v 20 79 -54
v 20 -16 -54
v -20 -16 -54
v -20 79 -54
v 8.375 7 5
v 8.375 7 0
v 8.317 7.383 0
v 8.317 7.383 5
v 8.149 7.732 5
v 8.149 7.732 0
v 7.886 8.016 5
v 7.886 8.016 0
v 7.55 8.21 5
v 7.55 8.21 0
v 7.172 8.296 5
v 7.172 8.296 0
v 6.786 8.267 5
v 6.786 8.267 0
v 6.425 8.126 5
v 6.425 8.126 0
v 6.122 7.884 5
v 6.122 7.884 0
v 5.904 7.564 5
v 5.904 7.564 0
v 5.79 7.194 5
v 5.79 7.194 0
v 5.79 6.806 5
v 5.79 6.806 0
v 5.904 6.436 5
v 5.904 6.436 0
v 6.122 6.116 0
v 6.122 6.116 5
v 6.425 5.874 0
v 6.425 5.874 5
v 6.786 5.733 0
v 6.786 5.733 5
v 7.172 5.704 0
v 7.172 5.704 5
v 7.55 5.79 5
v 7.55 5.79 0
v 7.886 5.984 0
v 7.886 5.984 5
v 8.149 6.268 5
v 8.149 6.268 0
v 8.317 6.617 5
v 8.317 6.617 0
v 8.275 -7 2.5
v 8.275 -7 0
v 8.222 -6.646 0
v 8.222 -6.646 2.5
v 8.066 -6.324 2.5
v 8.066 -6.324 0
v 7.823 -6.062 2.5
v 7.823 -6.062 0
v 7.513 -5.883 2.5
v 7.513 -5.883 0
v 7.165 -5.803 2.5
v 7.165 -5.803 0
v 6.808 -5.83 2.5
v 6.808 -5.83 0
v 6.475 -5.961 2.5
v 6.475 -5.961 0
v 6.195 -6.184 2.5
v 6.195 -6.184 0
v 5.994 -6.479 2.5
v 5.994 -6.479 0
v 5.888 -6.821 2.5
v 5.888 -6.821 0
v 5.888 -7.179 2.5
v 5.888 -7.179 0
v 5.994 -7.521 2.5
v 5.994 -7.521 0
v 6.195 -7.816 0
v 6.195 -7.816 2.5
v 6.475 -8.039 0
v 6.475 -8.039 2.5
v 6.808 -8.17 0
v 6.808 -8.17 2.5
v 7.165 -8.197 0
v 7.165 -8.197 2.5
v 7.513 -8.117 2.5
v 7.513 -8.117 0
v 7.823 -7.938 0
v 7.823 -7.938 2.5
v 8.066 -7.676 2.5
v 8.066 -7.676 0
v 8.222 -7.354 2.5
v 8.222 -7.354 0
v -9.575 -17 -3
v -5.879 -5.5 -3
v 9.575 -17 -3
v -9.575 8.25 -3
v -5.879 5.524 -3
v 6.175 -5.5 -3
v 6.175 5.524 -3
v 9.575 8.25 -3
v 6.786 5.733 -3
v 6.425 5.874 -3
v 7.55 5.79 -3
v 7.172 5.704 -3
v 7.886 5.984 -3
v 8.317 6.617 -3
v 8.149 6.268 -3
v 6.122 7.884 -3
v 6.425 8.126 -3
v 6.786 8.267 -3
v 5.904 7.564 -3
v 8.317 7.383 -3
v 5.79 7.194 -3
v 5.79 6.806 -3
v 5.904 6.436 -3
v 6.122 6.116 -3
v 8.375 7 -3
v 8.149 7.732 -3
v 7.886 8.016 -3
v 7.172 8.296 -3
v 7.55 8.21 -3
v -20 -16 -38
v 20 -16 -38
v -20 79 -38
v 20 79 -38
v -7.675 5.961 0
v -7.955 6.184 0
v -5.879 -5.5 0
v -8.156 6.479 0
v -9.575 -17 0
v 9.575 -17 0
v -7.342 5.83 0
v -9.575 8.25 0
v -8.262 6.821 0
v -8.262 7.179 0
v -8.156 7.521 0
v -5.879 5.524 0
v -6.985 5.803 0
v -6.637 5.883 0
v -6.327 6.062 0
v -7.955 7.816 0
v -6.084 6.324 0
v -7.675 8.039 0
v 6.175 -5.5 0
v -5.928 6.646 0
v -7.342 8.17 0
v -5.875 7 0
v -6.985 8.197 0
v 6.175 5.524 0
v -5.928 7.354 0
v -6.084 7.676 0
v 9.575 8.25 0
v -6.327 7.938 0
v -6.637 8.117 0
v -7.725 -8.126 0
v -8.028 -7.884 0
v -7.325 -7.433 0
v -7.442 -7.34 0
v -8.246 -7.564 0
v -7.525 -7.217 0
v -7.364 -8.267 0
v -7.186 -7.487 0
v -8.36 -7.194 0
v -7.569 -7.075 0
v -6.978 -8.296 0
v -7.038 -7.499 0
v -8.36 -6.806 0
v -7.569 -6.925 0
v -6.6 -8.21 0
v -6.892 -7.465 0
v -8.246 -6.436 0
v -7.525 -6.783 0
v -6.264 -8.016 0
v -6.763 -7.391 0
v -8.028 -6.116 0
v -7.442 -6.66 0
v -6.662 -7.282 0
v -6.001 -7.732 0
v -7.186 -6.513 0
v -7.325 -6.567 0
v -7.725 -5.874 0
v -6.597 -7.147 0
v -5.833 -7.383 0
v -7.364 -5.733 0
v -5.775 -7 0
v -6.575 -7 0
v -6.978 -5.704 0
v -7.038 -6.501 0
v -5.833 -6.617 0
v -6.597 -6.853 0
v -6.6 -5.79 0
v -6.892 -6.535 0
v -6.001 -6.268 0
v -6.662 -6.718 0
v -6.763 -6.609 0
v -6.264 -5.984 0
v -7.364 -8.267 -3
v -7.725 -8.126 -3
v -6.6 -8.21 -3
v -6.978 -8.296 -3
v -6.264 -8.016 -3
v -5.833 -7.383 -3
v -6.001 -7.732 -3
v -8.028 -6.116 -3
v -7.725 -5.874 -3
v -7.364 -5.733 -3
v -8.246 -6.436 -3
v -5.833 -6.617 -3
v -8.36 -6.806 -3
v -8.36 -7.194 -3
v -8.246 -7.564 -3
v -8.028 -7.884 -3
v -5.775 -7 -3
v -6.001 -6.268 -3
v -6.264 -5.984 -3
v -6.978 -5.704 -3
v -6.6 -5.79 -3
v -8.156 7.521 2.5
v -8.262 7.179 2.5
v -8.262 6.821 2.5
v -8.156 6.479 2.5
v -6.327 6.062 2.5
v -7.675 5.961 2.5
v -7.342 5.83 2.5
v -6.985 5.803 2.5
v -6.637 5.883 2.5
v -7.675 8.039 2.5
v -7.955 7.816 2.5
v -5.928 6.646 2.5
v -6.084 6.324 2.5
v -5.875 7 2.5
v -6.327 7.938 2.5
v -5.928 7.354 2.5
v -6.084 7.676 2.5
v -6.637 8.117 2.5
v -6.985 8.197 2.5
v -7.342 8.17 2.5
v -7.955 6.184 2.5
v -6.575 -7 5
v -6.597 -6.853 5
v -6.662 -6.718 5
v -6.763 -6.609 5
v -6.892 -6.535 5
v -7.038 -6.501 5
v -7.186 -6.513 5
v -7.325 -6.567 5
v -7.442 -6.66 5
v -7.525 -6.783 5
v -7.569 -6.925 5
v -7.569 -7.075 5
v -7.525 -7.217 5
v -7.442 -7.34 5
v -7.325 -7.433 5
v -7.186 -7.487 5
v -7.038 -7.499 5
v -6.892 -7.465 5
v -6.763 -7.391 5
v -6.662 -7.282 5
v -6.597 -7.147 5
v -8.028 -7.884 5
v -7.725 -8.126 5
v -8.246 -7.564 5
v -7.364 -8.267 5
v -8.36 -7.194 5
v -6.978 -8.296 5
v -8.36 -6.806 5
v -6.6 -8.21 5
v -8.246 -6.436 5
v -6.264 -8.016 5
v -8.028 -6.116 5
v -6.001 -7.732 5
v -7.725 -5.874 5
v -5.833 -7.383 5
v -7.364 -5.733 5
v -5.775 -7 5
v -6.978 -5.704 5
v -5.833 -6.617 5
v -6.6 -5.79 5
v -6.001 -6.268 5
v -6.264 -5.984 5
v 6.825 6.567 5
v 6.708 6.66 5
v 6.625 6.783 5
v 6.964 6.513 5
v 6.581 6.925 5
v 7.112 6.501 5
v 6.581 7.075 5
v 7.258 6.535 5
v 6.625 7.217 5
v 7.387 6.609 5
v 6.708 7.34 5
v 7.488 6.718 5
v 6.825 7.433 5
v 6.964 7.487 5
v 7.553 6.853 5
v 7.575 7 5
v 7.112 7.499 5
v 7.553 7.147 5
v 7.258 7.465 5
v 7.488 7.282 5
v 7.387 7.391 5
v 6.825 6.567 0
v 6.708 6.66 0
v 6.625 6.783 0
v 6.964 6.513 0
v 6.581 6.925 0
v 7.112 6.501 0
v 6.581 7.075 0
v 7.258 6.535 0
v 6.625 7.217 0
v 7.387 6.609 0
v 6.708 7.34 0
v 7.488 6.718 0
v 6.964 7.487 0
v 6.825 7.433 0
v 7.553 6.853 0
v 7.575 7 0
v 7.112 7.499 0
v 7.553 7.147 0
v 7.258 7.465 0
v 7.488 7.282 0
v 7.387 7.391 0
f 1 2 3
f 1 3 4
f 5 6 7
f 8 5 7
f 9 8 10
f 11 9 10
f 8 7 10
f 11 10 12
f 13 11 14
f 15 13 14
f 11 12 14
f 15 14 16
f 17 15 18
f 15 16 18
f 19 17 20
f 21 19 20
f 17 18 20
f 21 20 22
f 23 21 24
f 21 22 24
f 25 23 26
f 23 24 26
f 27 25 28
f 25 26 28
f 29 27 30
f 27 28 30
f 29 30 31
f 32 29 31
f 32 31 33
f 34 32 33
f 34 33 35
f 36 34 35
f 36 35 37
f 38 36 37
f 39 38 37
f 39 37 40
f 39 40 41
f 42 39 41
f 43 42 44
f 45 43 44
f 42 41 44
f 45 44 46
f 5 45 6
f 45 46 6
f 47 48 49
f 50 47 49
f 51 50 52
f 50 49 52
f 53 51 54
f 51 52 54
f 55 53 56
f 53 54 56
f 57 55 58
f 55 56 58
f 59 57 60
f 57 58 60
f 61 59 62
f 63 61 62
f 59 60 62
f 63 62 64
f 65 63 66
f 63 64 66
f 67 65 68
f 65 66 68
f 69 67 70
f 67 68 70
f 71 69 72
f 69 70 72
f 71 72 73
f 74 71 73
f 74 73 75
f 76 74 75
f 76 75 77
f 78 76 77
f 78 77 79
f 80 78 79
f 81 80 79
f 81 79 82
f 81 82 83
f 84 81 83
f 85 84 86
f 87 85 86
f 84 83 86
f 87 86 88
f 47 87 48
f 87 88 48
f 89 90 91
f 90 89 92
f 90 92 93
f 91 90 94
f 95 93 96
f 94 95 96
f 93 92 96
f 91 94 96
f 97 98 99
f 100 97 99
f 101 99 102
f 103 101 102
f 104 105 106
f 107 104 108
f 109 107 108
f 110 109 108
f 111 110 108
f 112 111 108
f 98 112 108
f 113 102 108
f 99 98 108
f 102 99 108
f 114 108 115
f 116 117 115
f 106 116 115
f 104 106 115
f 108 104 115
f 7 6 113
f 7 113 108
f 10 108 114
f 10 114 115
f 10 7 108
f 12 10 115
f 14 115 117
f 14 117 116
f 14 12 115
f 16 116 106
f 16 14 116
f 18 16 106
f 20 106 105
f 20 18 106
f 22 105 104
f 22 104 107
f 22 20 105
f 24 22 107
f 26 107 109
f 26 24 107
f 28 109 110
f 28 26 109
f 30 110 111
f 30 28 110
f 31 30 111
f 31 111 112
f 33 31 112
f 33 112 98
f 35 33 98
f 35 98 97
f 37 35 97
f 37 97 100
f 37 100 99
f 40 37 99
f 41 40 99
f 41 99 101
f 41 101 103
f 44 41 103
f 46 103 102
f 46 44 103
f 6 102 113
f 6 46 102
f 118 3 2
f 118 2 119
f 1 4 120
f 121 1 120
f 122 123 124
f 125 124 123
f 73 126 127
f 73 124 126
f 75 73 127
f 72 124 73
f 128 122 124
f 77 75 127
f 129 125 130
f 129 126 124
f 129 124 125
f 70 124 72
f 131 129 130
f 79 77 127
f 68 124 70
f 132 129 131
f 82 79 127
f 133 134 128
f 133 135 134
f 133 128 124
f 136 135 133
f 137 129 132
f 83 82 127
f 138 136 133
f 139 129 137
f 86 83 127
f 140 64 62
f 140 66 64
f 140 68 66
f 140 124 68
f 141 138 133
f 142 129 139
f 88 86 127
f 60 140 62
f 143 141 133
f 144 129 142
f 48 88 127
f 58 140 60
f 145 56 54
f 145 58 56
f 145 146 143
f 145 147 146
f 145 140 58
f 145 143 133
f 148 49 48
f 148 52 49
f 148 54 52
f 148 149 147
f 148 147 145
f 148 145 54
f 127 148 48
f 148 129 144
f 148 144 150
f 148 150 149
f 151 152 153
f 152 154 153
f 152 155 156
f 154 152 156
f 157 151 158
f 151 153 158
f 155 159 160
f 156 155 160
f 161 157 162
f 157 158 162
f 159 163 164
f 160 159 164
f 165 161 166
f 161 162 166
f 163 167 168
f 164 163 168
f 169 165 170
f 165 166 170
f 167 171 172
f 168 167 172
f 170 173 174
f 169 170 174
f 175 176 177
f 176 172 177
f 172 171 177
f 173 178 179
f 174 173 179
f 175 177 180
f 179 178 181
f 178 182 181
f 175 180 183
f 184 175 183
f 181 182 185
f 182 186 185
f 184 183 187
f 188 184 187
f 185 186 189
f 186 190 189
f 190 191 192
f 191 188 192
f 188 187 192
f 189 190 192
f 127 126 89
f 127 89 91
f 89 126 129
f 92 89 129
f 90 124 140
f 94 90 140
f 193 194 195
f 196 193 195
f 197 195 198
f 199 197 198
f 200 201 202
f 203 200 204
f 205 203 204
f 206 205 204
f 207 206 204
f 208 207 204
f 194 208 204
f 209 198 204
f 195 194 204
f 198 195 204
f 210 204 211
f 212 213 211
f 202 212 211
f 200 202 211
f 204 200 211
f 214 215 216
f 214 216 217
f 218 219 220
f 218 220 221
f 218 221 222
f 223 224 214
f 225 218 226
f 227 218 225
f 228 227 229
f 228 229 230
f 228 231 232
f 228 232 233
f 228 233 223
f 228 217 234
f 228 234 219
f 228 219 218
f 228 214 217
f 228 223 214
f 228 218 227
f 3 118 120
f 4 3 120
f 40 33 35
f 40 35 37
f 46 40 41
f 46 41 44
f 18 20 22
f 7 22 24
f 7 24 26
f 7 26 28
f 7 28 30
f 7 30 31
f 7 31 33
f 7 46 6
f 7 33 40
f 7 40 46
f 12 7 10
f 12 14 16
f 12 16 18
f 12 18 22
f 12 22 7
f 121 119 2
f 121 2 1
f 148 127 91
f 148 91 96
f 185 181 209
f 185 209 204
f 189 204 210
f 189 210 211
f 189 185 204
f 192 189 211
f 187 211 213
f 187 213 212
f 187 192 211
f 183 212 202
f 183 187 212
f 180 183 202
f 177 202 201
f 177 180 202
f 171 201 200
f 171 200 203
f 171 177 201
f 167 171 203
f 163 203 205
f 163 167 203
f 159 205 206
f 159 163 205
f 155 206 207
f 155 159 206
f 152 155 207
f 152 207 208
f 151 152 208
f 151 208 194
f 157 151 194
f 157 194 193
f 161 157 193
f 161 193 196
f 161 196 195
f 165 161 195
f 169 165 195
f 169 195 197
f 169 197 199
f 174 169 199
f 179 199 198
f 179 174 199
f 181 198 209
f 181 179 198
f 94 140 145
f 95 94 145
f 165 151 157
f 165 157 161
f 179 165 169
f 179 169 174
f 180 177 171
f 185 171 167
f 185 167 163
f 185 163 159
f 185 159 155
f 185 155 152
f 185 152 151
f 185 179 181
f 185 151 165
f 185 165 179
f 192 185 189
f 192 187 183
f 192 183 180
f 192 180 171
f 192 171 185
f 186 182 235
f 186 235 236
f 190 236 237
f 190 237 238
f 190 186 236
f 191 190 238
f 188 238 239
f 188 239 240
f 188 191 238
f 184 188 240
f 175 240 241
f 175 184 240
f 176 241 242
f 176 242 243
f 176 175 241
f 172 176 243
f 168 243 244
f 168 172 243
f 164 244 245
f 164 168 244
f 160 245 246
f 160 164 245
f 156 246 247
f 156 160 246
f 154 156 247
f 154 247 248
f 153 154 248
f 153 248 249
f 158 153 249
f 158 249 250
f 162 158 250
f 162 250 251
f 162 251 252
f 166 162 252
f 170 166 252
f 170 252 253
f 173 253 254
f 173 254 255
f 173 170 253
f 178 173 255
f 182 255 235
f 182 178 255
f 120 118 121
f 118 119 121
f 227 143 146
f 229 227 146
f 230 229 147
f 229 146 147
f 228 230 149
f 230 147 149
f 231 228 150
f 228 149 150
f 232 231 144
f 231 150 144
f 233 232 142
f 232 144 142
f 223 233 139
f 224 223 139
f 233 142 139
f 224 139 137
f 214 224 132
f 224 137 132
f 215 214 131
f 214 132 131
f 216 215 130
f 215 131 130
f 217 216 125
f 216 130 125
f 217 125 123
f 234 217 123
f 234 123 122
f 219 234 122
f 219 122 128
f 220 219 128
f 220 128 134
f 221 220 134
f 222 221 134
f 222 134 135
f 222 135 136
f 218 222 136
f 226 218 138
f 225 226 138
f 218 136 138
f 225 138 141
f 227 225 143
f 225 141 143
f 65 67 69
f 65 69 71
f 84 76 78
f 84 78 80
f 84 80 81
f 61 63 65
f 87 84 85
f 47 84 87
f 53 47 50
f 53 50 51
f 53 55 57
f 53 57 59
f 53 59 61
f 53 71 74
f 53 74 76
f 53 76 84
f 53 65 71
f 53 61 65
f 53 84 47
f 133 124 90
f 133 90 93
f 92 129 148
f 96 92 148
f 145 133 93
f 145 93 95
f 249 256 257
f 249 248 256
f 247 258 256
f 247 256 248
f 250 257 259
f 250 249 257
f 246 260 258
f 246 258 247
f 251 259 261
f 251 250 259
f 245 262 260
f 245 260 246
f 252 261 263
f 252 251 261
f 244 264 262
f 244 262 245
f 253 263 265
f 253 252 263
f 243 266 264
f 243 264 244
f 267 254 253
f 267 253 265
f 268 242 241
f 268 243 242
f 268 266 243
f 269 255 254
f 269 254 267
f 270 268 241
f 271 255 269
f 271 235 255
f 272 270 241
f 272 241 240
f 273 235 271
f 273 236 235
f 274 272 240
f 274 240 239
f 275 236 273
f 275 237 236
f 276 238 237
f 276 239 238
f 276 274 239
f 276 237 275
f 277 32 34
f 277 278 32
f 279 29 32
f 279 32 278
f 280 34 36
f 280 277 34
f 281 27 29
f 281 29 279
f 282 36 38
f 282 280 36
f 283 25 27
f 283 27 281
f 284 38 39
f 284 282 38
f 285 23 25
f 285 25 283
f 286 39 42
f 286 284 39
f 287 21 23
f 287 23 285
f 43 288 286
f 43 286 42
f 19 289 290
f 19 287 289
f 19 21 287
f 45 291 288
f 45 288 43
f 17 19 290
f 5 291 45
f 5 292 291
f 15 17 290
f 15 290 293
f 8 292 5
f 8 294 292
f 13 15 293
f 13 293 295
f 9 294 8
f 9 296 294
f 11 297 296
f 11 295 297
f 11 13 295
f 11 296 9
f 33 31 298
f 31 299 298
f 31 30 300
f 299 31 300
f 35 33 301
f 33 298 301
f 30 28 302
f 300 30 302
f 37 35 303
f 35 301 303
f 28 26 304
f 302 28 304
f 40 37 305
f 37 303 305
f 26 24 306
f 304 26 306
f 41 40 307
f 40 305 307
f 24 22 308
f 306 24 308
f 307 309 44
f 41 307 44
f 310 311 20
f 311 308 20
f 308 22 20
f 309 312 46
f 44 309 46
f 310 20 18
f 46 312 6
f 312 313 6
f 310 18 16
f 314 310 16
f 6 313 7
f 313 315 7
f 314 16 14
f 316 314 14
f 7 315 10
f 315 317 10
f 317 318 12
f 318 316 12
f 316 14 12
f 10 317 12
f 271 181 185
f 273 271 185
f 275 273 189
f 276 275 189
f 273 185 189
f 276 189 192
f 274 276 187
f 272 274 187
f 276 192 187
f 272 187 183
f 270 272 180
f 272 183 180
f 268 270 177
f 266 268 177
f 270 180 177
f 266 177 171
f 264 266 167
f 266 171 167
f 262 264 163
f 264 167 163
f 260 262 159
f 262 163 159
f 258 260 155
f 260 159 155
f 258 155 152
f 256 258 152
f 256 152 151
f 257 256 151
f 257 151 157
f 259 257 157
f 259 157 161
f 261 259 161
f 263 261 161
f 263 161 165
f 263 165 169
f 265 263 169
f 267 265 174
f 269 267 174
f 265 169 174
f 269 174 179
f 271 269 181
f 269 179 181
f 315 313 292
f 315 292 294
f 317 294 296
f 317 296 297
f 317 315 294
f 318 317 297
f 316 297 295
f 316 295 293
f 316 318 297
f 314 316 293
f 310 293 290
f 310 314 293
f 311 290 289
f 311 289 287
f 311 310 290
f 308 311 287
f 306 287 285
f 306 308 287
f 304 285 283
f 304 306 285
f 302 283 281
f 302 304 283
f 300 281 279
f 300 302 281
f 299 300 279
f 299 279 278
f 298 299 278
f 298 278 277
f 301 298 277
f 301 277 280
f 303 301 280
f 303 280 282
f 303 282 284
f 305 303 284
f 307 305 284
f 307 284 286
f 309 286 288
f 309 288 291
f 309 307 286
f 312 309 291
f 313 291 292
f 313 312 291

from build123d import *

# Parameters (mm, degrees)
F0_R           = 1.3
F1_DEPTH       = 5
F2_R           = 0.5
F3_DEPTH       = 5
F4_W           = 19.15
F4_H           = 25.25
F4_W_2         = 12.05398
F4_H_2         = 11.024051
F5_DEPTH       = 3
F6_DEPTH       = 3
F7_R           = 1.2
F8_DEPTH       = 2.5
F9_W           = 95
F9_H           = 16
F10_DEPTH      = 20
F10_DEPTH_BACK = 20


with BuildPart() as f1:
    # F0 (on Top) → F1 (new body)
    with BuildSketch(Plane.XY):
        with Locations((7.075, 7)):
            Circle(F0_R)
        with Locations((-7.075, -7)):
            Circle(F0_R)
    extrude(amount=F1_DEPTH)

    # F2 (on Top) → F3 (cut)
    with BuildSketch(Plane.XY):
        with Locations((-7.075, -7)):
            Circle(F2_R)
        with Locations((7.075, 7)):
            Circle(F2_R)
    extrude(amount=F3_DEPTH, mode=Mode.SUBTRACT)


with BuildPart() as f5:
    # F4 (on Top) → F5 (new body)
    with BuildSketch(Plane.XY):
        with Locations((0, -4.375)):
            Rectangle(F4_W, F4_H)
        with Locations((0.14762, 0.012107)):
            Rectangle(F4_W_2, F4_H_2, mode=Mode.SUBTRACT)
    extrude(amount=-F5_DEPTH)

    # F7 (on Top) → F8 (join)
    with BuildSketch(Plane.XY):
        with Locations((-7.075, 7)):
            Circle(F7_R)
        with Locations((7.075, -7)):
            Circle(F7_R)
    extrude(amount=F8_DEPTH)


with BuildPart() as f6:
    # F0 (on Top) → F6 (new body)
    with BuildSketch(Plane.XY):
        with Locations((7.075, 7)):
            Circle(F0_R)
        with Locations((-7.075, -7)):
            Circle(F0_R)
    extrude(amount=-F6_DEPTH)


with BuildPart() as f10:
    # F9 (on Right) → F10 (new body, two sides)
    with BuildSketch(Plane.YZ) as f10_sk:
        with Locations((31.5, -46)):
            Rectangle(F9_W, F9_H)
    extrude(amount=F10_DEPTH)
    extrude(f10_sk.sketch, amount=-F10_DEPTH_BACK)


solid = Compound([f1.part, f5.part, f6.part, f10.part])
